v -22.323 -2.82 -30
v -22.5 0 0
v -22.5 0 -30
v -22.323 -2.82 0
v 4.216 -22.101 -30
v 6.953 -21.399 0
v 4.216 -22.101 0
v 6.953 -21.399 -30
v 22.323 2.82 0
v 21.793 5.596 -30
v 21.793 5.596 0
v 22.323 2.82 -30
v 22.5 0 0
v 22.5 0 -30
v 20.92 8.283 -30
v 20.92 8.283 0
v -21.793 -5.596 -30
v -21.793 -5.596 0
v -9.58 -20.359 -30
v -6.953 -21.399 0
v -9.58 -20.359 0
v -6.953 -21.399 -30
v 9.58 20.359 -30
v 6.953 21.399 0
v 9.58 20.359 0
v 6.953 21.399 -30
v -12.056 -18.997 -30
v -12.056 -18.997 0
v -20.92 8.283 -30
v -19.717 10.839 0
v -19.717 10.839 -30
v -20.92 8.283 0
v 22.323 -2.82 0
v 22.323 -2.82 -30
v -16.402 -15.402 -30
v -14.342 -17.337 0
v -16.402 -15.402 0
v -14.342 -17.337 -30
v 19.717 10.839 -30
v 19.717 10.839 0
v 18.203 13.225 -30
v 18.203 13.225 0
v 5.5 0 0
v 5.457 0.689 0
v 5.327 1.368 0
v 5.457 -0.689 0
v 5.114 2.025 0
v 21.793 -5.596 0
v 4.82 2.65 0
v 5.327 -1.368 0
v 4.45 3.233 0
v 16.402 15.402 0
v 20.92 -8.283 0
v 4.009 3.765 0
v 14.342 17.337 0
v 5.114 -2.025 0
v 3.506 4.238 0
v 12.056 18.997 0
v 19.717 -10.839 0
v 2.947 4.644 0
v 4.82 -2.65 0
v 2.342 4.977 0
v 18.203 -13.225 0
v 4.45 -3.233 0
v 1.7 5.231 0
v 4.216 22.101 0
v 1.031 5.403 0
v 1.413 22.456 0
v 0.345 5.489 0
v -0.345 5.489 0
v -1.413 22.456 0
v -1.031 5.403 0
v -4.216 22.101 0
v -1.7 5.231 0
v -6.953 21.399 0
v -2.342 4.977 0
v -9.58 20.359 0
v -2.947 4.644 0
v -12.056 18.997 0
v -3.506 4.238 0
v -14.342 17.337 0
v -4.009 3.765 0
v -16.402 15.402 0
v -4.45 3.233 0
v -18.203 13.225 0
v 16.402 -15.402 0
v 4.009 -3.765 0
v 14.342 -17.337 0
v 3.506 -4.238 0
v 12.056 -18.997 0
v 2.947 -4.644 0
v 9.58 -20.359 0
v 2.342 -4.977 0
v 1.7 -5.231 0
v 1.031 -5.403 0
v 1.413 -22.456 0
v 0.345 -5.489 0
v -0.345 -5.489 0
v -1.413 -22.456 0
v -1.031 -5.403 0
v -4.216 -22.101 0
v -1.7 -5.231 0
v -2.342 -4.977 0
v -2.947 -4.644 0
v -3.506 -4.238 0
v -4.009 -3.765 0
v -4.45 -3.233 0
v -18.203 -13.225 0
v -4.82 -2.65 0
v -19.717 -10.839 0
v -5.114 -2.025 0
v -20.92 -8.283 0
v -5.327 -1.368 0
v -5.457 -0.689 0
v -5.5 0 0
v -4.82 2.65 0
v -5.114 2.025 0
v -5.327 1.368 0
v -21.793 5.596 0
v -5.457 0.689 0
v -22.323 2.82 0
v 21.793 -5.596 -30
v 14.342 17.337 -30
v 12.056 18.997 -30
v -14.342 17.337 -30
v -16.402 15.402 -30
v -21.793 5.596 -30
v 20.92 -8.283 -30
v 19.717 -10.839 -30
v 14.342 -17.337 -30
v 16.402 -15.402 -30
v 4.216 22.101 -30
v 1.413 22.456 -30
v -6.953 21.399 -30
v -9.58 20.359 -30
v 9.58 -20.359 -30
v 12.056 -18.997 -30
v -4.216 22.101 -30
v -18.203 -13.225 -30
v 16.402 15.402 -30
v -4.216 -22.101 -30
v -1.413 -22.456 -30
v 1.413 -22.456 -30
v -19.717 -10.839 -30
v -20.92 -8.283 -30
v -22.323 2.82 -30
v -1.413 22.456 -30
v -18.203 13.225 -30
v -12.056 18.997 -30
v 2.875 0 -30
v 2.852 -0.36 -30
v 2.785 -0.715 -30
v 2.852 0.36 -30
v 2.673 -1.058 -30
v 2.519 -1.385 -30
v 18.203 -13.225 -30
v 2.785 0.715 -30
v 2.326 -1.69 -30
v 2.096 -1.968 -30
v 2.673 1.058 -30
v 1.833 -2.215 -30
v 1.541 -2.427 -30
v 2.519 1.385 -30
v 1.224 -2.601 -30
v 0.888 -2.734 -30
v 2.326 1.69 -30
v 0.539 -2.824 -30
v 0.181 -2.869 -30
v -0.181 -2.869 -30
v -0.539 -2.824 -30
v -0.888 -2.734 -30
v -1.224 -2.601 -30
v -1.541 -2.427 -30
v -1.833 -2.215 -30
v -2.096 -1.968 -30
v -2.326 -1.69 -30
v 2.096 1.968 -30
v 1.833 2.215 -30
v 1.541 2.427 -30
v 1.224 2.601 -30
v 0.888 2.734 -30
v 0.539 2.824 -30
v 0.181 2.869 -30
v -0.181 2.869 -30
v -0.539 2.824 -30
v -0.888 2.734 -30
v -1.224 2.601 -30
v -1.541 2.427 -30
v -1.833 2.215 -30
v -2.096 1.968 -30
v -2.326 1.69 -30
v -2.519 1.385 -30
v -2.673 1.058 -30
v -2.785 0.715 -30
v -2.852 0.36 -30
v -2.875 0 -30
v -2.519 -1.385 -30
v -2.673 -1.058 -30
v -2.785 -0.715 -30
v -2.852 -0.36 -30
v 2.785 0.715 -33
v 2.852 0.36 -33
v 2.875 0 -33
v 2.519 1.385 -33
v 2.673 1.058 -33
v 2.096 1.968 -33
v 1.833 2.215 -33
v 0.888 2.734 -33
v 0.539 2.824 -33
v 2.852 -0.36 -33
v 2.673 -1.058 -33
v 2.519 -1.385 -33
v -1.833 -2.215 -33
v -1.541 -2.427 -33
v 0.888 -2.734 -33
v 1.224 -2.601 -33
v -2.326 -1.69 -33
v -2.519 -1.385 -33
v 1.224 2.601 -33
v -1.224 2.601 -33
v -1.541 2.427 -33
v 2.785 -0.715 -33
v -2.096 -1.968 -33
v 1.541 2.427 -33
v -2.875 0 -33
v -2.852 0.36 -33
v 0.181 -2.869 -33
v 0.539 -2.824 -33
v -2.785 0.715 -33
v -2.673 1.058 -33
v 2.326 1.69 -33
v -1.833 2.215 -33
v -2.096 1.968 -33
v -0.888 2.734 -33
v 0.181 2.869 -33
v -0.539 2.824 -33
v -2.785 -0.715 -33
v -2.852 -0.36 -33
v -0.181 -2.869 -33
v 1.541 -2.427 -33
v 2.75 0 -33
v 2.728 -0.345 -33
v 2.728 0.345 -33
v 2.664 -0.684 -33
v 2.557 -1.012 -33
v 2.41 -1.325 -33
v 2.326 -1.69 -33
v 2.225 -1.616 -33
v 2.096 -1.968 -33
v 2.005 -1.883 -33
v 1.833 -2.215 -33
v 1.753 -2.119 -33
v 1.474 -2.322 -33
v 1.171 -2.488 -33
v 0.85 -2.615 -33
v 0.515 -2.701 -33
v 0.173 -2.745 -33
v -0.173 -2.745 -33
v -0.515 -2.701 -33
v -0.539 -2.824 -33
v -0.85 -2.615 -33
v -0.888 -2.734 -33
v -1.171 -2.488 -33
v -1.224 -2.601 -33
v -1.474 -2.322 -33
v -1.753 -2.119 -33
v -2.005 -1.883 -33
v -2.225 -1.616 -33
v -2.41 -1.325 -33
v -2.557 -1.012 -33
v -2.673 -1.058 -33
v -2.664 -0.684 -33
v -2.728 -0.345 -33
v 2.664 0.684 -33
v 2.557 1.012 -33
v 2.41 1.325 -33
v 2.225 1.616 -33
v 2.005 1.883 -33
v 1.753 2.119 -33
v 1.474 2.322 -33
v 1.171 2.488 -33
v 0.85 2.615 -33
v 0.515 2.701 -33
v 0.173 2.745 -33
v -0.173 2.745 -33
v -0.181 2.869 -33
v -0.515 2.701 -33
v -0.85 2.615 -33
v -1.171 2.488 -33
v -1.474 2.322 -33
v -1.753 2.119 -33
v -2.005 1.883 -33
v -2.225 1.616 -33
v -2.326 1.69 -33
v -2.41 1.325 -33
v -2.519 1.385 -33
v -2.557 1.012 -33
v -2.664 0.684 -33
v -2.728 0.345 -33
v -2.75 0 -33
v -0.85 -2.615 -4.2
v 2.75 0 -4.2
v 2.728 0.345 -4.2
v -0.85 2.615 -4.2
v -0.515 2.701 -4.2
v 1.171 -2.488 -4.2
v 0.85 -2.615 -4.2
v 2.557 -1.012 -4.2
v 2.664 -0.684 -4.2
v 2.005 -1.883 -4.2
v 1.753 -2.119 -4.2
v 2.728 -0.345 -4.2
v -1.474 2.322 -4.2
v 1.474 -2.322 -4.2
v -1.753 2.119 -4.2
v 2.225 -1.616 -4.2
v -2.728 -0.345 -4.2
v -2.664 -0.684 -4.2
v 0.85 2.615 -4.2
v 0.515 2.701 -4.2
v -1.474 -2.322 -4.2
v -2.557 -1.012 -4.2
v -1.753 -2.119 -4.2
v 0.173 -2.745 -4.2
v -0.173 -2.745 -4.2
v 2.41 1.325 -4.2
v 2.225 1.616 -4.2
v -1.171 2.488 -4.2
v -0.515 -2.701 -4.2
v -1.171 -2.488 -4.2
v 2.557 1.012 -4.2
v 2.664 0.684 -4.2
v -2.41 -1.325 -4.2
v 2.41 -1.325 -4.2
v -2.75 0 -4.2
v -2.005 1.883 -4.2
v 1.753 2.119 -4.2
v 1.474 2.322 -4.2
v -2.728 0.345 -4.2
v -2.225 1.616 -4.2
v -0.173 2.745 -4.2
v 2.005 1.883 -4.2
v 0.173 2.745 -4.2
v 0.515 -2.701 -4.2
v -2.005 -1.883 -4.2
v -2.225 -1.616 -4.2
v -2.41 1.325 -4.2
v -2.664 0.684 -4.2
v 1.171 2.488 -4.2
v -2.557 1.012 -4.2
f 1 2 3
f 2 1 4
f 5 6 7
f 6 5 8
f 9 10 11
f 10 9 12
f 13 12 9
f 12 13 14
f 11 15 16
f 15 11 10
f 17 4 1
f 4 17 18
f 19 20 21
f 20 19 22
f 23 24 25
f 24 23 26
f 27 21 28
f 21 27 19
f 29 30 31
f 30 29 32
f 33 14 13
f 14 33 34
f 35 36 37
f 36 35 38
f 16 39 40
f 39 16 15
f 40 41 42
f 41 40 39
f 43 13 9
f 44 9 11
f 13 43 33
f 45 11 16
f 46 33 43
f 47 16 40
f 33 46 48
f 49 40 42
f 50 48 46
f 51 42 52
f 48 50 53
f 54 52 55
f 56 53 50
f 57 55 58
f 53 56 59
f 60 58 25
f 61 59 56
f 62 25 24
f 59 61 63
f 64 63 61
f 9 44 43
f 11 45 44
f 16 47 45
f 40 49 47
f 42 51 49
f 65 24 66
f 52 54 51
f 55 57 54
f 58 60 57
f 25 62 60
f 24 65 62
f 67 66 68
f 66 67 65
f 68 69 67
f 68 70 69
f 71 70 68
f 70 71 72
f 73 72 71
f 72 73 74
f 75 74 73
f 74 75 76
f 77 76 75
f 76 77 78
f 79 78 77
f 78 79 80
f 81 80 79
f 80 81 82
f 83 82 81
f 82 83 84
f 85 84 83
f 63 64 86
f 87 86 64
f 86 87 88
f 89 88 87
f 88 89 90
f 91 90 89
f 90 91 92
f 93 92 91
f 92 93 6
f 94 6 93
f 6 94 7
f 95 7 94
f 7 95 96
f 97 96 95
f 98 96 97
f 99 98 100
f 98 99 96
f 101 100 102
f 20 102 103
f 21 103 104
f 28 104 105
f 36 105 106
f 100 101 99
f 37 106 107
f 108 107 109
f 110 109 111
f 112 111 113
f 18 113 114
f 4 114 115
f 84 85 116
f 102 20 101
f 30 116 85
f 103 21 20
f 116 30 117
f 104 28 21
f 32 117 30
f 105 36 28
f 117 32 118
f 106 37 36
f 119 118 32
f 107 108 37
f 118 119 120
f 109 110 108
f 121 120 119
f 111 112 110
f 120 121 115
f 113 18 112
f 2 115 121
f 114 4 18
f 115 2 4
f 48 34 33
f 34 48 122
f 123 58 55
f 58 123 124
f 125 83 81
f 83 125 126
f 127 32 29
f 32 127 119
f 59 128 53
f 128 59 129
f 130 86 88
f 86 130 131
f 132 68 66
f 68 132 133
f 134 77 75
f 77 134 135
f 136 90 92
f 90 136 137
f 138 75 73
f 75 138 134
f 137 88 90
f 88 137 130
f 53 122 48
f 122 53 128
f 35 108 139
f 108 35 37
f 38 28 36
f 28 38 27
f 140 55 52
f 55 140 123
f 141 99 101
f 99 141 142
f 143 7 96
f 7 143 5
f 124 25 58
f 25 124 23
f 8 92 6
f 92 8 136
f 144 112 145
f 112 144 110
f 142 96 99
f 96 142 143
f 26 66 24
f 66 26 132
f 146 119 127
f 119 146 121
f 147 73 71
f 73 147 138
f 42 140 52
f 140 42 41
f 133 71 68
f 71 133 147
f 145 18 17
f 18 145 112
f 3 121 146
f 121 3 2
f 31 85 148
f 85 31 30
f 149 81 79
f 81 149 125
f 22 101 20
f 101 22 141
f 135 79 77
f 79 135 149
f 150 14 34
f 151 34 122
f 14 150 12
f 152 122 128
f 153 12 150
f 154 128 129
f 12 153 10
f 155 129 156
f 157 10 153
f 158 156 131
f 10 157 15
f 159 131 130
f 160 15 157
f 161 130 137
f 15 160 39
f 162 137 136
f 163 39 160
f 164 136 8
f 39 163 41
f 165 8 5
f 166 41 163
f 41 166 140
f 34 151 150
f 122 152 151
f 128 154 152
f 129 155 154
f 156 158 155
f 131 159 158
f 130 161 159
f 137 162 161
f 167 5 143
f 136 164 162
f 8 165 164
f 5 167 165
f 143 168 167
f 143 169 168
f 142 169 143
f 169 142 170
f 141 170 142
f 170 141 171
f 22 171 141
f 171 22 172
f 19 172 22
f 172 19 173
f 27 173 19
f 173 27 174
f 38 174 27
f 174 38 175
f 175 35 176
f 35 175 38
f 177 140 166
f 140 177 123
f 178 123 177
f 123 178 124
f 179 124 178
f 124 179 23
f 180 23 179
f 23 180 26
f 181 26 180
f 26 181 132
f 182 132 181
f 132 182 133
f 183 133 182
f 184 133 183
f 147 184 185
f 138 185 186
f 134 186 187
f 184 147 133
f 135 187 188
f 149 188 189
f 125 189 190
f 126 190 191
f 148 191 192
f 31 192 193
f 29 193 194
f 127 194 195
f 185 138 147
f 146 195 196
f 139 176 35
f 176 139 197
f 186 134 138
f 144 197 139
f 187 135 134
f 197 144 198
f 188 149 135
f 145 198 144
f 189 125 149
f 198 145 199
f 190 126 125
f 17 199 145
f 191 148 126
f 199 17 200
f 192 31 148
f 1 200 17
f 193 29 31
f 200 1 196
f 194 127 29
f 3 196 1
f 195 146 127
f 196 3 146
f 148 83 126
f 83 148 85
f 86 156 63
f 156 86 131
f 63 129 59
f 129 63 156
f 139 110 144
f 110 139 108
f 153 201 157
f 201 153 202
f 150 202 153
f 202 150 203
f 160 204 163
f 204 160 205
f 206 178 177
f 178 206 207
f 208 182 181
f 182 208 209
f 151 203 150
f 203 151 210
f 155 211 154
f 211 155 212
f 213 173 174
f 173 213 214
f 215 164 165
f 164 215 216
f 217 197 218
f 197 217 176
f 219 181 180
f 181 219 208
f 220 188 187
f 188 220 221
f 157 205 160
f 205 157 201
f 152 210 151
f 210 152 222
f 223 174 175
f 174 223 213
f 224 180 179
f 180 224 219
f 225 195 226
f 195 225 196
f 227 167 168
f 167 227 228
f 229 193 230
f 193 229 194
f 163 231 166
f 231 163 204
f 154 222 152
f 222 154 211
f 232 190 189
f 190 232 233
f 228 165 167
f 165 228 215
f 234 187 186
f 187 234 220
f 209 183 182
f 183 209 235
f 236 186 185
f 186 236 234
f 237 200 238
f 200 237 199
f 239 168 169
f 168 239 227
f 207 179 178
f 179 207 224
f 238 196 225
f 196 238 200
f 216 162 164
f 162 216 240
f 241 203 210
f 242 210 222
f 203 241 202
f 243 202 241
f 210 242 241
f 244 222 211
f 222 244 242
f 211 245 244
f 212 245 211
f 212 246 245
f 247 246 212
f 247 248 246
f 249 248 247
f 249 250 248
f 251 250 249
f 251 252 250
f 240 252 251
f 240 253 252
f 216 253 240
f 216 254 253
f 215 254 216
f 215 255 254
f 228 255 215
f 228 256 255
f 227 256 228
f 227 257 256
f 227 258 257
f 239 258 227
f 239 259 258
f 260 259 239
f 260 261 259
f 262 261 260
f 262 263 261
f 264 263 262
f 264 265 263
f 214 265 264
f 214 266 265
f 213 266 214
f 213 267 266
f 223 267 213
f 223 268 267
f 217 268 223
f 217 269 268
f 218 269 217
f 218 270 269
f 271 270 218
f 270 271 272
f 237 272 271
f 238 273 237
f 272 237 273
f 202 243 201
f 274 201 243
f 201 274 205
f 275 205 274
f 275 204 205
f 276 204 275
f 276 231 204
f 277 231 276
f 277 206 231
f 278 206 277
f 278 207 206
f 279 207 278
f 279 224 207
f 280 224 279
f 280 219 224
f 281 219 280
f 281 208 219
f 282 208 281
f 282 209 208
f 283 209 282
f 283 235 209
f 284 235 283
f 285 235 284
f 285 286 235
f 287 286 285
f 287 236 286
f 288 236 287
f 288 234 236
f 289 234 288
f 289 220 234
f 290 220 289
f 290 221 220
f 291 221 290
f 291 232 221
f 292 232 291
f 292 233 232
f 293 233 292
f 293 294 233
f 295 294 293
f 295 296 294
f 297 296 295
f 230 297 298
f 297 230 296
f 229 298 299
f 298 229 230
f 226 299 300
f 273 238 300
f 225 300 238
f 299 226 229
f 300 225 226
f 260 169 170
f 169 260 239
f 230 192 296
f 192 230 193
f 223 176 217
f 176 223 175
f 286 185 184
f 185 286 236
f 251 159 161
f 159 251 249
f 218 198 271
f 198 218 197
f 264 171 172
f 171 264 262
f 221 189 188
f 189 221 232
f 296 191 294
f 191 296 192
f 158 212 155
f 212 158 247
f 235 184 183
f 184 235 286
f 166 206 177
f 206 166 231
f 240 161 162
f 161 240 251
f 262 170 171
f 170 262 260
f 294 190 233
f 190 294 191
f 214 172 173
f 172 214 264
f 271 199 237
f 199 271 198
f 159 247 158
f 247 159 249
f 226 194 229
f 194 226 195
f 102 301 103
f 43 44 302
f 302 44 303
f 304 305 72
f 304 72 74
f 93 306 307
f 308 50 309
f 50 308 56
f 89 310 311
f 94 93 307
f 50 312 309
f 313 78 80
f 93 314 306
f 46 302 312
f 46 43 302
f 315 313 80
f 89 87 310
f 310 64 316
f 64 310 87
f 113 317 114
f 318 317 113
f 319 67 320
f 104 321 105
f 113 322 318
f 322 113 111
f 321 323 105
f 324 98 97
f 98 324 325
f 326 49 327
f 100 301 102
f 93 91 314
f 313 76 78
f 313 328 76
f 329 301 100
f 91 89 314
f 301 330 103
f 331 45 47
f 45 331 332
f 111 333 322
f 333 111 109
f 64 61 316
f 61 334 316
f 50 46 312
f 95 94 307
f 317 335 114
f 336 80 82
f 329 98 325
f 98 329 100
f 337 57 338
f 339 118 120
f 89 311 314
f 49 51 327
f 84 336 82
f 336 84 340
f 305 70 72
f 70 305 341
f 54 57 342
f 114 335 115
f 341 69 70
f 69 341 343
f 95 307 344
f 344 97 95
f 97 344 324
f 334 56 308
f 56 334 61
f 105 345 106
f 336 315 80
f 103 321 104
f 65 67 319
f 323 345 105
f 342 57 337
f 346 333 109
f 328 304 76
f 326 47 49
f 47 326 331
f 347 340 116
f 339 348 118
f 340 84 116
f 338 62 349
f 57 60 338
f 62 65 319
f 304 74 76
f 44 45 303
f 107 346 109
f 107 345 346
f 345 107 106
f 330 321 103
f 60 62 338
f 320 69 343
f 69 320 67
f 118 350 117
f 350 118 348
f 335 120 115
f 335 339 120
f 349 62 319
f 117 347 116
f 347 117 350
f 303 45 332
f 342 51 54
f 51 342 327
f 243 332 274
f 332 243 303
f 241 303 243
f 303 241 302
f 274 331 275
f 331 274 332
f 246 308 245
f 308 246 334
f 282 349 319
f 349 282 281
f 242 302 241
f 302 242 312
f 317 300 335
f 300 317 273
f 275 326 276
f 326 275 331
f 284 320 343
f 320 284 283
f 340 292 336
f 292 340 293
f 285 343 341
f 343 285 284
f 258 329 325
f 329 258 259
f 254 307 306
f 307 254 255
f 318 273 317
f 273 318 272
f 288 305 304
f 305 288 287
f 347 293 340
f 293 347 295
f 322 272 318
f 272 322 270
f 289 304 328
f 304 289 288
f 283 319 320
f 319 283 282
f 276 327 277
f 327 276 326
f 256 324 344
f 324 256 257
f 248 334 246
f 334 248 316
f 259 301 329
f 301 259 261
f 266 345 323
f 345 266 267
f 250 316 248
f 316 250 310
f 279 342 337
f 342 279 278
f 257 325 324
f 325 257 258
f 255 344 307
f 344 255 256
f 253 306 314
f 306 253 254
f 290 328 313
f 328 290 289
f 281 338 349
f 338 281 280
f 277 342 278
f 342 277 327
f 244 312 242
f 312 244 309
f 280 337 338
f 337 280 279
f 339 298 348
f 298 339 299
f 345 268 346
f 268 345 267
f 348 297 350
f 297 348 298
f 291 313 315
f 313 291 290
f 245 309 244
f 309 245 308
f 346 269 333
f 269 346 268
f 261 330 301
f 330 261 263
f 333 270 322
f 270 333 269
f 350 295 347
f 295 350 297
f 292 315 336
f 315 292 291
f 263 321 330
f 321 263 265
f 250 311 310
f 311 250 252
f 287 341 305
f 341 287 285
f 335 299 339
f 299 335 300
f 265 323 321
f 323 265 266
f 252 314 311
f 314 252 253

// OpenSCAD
$fn = 50;

difference() {
	union() {
		translate(v = [0, 0, -30.0]) {
			cylinder(h = 30, r = 22.5);
		}
		#translate(v = [0, 0, -33.0]) {
			cylinder(h = 33, r = 2.875);
		}
	}
	union() {
		translate(v = [0, 0, 0]) {
			rotate(a = [0, 0, 0]) {
				difference() {
					union() {
						translate(v = [0, 0, -33.0]) {
							cylinder(h = 33, r = 2.25);
						}
						translate(v = [0, 0, -4.2]) {
							cylinder(h = 4.2, r1 = 2.75, r2 = 5.5);
						}
						translate(v = [0, 0, -33.0]) {
							cylinder(h = 33, r = 2.75);
						}
						translate(v = [0, 0, -33.0]) {
							cylinder(h = 33, r = 2.25);
						}
					}
					union();
				}
			}
		}
	}
}
